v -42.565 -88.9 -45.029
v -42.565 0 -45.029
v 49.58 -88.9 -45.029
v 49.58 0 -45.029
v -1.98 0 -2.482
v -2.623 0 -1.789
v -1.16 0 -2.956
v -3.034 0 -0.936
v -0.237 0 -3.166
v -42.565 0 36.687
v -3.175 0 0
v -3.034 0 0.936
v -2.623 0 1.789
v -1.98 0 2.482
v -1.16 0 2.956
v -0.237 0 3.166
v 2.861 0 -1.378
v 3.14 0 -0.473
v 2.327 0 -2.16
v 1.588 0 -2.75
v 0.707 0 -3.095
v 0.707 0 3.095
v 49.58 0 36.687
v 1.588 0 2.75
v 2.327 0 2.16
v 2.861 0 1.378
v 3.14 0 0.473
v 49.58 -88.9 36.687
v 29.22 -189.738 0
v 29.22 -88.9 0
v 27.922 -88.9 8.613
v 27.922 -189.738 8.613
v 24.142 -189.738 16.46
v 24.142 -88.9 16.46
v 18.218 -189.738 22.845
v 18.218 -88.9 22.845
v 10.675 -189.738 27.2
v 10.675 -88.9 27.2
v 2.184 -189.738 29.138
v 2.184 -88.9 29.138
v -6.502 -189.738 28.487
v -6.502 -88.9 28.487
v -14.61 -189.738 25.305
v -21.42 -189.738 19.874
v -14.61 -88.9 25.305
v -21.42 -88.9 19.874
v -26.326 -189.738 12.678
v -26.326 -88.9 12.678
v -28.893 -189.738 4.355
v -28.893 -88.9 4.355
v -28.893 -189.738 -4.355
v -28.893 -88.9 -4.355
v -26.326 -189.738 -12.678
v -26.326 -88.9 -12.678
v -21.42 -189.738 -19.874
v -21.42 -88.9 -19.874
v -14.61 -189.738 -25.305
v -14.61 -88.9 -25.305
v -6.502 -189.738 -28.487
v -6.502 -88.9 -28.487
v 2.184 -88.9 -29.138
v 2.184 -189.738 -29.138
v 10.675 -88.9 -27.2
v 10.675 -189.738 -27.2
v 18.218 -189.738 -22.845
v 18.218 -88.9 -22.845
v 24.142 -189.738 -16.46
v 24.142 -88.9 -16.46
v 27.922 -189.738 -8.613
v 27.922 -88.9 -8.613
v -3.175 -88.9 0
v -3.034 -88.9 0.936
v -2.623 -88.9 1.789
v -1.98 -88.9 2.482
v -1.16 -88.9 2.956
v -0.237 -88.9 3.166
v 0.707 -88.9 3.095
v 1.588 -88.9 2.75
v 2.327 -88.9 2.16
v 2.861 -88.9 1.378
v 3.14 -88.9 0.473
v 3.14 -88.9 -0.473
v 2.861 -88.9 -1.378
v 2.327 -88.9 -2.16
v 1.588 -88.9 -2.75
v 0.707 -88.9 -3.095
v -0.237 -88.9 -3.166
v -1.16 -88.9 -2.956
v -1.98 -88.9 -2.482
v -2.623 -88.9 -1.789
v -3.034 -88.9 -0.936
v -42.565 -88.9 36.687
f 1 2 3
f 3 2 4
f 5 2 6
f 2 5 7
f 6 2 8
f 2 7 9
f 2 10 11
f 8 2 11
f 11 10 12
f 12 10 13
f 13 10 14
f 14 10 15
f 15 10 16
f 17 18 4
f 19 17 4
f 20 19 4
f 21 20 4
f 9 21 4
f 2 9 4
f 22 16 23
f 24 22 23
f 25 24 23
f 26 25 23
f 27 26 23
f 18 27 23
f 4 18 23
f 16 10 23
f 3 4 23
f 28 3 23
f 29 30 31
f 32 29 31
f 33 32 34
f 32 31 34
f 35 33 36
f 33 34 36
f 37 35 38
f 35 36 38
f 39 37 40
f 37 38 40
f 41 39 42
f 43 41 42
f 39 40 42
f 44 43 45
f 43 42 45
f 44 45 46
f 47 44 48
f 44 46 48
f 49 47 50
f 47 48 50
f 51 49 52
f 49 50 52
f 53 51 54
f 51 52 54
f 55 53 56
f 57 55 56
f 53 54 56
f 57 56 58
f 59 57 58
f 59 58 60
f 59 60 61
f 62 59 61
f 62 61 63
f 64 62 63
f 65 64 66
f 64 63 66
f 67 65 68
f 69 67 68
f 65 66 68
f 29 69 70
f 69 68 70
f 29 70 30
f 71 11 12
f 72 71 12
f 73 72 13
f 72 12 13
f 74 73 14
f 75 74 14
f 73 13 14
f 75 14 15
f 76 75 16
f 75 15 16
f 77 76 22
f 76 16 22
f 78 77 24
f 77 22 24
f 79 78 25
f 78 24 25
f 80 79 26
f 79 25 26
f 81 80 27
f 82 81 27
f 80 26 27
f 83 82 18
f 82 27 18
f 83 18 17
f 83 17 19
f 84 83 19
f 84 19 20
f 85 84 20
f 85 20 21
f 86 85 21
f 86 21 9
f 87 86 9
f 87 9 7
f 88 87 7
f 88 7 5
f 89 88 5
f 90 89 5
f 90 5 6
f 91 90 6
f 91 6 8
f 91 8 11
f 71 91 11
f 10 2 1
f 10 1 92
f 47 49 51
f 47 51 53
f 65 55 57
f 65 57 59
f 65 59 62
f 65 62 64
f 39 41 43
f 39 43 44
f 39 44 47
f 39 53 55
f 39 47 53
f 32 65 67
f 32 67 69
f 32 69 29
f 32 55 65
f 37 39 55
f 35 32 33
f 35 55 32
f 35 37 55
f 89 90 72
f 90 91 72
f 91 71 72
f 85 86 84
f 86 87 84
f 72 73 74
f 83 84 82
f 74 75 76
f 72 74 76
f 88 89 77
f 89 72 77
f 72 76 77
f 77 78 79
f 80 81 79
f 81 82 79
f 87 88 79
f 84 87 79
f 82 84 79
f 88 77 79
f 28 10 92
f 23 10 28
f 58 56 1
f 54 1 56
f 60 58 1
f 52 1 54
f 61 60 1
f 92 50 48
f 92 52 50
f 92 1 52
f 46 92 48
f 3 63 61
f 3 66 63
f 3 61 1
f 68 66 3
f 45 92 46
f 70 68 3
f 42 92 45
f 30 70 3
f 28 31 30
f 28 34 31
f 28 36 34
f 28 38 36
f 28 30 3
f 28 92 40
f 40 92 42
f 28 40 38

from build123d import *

# Parameters (mm, degrees)
F0_W     = 92.144217
F0_H     = 81.716377
F1_DEPTH = 88.9
F3_D     = 6.35
F4_R     = 29.219742
F5_DEPTH = 100.838


with BuildPart() as f1:
    # F0 (on Front) → F1 (new body)
    with BuildSketch(Plane.XZ):
        with Locations((3.507545, -4.171138)):
            Rectangle(F0_W, F0_H)
    extrude(amount=F1_DEPTH)

    # F3 (through all)
    with Locations(Plane.XZ.offset(88.9)):
        with Locations((0, 0)):
            Hole(F3_D / 2)

    # F4 (on face) → F5 (join)
    with BuildSketch(Plane.XZ.offset(88.9)):
        Circle(F4_R)
    extrude(amount=F5_DEPTH)


solid = f1.part
